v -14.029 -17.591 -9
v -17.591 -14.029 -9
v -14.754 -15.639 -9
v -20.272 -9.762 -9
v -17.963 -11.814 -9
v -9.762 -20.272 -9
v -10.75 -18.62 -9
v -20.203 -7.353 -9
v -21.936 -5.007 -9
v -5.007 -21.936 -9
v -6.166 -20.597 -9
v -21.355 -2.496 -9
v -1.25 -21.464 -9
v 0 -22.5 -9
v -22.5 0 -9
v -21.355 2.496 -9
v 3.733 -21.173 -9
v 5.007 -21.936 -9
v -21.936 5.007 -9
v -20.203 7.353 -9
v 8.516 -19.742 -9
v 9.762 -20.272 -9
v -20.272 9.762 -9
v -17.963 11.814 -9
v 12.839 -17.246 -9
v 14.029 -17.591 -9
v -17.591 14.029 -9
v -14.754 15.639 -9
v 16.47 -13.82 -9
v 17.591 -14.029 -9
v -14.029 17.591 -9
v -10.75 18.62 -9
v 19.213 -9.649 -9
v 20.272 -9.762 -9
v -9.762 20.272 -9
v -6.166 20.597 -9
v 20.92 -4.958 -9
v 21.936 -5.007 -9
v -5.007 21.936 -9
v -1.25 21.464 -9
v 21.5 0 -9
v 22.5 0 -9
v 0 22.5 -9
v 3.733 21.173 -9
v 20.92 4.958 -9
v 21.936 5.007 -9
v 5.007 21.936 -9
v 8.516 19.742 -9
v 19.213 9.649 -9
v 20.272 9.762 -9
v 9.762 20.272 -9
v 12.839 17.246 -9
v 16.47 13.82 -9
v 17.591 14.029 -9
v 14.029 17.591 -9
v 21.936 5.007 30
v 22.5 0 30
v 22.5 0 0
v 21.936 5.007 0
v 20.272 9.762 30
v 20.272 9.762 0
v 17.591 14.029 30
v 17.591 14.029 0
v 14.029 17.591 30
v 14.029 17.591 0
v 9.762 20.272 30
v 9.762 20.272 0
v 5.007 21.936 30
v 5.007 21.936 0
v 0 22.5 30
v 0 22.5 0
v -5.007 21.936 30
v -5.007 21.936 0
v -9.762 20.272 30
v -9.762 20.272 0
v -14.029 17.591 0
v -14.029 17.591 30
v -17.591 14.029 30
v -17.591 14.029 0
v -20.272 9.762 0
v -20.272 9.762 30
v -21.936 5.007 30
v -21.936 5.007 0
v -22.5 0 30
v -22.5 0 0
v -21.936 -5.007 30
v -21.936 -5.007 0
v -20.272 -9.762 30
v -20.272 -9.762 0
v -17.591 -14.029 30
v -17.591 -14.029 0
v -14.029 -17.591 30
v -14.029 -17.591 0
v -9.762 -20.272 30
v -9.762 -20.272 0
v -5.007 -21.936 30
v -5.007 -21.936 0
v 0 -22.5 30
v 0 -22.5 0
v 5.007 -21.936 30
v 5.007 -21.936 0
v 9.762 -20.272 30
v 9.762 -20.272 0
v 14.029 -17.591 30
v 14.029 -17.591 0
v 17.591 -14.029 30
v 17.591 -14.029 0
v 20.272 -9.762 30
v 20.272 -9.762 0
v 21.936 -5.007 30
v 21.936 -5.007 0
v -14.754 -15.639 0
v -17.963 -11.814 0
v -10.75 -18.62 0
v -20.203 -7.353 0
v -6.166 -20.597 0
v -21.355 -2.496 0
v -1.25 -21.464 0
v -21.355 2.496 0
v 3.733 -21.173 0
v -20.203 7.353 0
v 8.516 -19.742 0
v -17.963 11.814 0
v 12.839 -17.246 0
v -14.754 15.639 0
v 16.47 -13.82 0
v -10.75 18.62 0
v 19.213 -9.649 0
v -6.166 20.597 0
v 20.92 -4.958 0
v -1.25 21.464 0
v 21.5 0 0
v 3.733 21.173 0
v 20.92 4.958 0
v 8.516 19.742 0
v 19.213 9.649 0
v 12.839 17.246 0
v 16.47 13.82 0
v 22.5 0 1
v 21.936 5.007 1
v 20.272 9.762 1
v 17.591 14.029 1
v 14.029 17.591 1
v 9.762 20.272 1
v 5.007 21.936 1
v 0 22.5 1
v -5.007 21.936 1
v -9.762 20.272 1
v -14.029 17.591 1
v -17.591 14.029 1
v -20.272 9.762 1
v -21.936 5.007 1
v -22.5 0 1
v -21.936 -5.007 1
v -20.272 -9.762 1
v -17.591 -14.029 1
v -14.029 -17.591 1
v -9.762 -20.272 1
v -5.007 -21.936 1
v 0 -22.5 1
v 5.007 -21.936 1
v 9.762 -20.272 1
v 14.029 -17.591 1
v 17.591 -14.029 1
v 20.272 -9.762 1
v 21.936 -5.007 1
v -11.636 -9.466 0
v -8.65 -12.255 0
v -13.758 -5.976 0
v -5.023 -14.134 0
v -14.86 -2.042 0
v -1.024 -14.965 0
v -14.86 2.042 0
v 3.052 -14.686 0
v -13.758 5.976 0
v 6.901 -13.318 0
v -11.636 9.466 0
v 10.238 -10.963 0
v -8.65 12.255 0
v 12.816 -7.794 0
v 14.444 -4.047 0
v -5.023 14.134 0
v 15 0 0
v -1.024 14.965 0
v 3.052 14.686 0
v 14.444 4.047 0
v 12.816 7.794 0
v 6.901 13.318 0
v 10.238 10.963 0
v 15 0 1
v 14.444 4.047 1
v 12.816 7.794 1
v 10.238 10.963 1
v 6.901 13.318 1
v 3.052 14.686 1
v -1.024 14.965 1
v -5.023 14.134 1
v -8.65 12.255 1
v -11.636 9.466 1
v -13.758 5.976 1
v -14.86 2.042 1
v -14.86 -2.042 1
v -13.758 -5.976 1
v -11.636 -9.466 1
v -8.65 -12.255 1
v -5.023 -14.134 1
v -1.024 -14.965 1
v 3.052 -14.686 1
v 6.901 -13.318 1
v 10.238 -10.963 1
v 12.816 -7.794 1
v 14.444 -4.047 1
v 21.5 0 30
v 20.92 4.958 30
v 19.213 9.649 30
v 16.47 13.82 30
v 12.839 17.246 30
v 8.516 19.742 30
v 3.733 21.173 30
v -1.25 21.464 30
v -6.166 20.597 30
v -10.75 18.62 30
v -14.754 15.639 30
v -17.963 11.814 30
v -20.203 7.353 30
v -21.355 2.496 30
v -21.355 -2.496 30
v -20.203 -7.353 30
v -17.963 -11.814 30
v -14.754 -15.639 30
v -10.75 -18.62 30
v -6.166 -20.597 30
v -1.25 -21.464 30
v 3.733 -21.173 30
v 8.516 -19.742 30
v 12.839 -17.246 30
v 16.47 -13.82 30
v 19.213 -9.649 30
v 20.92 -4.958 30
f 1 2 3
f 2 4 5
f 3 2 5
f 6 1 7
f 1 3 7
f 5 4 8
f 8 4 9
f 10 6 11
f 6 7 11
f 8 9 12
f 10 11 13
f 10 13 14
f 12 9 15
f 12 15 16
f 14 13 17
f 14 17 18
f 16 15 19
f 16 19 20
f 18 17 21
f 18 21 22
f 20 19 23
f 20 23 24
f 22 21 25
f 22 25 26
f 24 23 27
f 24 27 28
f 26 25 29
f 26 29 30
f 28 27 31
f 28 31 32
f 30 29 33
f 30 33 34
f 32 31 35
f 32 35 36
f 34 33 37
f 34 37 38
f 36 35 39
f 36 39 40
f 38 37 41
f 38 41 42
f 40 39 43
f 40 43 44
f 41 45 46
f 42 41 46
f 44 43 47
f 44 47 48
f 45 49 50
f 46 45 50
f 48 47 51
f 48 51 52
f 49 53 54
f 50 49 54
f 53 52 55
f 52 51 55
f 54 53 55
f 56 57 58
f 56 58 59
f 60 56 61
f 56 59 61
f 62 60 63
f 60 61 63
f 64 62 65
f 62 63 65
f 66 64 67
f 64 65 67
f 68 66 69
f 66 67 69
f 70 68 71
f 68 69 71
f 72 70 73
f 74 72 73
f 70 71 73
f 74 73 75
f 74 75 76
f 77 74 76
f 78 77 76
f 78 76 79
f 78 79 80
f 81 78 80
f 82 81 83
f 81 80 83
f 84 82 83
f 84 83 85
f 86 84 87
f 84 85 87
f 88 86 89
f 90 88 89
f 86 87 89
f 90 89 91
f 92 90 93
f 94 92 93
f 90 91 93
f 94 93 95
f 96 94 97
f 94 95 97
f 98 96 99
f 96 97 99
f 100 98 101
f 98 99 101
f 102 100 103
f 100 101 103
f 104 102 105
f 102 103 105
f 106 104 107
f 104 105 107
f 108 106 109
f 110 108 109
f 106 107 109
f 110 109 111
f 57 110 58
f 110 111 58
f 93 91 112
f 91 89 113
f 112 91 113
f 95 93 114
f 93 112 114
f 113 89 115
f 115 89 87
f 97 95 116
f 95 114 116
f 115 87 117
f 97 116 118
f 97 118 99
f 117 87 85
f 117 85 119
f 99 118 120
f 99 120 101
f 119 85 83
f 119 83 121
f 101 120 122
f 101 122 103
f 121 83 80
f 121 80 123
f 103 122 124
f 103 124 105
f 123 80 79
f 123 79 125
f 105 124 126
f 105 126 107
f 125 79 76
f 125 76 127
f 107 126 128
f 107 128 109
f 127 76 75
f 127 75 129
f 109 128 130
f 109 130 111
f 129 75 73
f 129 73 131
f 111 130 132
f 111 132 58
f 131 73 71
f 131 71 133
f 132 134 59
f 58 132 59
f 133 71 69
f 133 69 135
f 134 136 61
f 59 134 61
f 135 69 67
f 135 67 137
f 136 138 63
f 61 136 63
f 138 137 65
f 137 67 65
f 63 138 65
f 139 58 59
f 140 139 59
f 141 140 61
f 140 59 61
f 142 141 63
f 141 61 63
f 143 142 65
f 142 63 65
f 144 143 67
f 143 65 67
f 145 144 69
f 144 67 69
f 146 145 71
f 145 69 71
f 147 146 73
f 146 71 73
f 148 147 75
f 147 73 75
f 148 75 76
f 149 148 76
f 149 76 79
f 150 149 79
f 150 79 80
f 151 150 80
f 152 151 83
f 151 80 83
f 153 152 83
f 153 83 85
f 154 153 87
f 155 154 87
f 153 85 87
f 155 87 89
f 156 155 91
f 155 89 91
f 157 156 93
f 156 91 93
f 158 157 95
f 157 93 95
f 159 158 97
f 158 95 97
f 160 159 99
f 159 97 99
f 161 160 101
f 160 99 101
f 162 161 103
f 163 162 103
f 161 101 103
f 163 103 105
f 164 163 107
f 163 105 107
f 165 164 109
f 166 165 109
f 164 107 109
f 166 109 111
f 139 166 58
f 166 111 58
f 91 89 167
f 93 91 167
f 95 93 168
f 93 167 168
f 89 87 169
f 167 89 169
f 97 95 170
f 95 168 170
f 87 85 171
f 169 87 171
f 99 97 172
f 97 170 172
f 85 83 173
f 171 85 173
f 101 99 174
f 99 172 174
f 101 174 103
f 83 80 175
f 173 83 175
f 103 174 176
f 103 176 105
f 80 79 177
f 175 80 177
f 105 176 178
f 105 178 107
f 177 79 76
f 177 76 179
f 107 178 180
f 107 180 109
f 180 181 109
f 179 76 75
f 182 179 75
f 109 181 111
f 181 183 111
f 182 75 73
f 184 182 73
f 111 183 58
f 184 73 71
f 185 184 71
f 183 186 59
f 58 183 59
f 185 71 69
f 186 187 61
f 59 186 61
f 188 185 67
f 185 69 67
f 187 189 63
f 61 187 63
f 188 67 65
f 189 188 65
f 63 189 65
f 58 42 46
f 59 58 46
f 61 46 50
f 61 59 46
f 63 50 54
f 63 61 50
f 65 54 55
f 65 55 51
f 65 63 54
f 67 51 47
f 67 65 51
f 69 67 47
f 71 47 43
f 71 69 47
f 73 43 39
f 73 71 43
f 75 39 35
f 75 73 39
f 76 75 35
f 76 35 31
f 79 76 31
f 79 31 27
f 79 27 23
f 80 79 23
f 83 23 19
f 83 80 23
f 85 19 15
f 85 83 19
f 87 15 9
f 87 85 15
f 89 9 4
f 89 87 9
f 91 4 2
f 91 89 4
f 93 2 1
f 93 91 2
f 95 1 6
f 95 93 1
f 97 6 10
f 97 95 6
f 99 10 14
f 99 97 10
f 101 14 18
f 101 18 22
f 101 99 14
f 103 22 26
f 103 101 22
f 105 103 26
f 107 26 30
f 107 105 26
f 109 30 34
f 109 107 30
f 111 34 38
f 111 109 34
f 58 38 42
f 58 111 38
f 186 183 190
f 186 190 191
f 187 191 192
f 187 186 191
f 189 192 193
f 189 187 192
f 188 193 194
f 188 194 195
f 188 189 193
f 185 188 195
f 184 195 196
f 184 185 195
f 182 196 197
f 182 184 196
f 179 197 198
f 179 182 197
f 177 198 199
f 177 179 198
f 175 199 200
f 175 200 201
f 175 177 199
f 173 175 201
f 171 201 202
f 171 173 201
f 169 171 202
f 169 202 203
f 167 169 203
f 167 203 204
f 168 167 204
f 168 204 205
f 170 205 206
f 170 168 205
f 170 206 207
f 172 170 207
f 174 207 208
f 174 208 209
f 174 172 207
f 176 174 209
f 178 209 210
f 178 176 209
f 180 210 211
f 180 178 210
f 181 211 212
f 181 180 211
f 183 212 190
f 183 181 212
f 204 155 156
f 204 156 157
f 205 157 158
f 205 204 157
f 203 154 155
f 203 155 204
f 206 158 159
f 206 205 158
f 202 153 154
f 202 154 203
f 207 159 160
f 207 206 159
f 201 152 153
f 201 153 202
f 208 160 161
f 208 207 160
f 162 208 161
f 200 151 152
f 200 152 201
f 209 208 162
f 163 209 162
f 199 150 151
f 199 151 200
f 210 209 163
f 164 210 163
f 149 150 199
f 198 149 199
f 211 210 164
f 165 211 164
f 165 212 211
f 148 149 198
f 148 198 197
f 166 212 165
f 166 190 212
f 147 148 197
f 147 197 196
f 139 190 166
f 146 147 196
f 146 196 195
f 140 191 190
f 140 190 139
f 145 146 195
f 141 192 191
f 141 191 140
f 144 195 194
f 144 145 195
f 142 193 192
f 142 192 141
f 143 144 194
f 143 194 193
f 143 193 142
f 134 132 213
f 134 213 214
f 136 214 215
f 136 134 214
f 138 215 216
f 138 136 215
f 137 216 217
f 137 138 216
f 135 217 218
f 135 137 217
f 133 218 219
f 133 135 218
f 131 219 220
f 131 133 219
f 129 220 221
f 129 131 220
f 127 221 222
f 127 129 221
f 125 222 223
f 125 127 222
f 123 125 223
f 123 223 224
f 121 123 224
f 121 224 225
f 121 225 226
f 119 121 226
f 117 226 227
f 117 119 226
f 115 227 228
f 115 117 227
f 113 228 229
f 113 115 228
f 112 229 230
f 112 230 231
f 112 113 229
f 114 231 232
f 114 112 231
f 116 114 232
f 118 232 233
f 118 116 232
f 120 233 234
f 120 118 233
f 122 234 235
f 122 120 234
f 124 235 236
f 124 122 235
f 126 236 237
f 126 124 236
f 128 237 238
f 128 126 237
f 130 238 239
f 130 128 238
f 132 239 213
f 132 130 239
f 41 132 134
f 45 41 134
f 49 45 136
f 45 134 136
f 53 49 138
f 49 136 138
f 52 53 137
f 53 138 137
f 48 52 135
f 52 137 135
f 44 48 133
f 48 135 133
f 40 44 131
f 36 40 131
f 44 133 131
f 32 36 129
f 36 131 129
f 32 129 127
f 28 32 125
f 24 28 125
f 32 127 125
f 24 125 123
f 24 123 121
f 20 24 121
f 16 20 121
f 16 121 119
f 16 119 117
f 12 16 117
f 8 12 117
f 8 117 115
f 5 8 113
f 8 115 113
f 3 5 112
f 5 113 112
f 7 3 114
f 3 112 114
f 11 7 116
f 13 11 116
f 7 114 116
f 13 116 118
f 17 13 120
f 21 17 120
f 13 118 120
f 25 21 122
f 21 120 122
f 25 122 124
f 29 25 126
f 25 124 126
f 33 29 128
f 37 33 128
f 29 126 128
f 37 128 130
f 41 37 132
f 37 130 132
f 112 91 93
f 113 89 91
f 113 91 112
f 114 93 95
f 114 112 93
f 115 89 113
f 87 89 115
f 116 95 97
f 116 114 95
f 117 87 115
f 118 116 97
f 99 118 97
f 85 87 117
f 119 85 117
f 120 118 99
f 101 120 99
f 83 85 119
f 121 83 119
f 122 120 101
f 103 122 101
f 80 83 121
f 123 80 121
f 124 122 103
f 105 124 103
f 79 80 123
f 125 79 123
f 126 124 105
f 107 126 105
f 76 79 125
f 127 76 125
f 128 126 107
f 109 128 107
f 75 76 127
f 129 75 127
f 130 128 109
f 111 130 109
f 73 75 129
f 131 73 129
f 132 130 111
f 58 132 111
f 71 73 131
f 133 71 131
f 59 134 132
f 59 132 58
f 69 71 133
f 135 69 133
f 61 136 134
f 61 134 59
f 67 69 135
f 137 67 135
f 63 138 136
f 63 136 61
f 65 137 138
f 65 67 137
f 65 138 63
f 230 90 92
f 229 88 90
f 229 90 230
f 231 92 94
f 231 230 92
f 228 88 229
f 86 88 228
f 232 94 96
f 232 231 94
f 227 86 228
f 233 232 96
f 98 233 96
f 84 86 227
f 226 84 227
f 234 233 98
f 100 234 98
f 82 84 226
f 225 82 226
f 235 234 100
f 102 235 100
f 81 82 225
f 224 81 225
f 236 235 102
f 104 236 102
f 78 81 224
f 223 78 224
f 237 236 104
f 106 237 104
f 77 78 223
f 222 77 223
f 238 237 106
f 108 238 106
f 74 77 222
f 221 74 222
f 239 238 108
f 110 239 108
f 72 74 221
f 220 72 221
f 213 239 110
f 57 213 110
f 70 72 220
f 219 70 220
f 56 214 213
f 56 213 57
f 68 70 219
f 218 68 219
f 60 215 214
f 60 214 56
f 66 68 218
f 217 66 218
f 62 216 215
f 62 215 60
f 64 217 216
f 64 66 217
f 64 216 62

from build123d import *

# Parameters (mm, degrees)
F0_R     = 22.5
F0_R_2   = 21.5
F1_DEPTH = 9
F0_R_3   = 15
F2_DEPTH = 1
F3_DEPTH = 30


with BuildPart() as f1:
    # F0 (on Top) → F1 (new body)
    with BuildSketch(Plane.XY):
        Circle(F0_R)
        Circle(F0_R_2, mode=Mode.SUBTRACT)
    extrude(amount=-F1_DEPTH)


with BuildPart() as f2:
    # F0 (on Top) → F2 (new body)
    with BuildSketch(Plane.XY):
        Circle(F0_R)
        Circle(F0_R_2, mode=Mode.SUBTRACT)
        Circle(F0_R_2)
        Circle(F0_R_3, mode=Mode.SUBTRACT)
    extrude(amount=F2_DEPTH)


with BuildPart() as f3:
    # F0 (on Top) → F3 (new body)
    with BuildSketch(Plane.XY):
        Circle(F0_R)
        Circle(F0_R_2, mode=Mode.SUBTRACT)
    extrude(amount=F3_DEPTH)


solid = Compound([f1.part, f2.part, f3.part])
